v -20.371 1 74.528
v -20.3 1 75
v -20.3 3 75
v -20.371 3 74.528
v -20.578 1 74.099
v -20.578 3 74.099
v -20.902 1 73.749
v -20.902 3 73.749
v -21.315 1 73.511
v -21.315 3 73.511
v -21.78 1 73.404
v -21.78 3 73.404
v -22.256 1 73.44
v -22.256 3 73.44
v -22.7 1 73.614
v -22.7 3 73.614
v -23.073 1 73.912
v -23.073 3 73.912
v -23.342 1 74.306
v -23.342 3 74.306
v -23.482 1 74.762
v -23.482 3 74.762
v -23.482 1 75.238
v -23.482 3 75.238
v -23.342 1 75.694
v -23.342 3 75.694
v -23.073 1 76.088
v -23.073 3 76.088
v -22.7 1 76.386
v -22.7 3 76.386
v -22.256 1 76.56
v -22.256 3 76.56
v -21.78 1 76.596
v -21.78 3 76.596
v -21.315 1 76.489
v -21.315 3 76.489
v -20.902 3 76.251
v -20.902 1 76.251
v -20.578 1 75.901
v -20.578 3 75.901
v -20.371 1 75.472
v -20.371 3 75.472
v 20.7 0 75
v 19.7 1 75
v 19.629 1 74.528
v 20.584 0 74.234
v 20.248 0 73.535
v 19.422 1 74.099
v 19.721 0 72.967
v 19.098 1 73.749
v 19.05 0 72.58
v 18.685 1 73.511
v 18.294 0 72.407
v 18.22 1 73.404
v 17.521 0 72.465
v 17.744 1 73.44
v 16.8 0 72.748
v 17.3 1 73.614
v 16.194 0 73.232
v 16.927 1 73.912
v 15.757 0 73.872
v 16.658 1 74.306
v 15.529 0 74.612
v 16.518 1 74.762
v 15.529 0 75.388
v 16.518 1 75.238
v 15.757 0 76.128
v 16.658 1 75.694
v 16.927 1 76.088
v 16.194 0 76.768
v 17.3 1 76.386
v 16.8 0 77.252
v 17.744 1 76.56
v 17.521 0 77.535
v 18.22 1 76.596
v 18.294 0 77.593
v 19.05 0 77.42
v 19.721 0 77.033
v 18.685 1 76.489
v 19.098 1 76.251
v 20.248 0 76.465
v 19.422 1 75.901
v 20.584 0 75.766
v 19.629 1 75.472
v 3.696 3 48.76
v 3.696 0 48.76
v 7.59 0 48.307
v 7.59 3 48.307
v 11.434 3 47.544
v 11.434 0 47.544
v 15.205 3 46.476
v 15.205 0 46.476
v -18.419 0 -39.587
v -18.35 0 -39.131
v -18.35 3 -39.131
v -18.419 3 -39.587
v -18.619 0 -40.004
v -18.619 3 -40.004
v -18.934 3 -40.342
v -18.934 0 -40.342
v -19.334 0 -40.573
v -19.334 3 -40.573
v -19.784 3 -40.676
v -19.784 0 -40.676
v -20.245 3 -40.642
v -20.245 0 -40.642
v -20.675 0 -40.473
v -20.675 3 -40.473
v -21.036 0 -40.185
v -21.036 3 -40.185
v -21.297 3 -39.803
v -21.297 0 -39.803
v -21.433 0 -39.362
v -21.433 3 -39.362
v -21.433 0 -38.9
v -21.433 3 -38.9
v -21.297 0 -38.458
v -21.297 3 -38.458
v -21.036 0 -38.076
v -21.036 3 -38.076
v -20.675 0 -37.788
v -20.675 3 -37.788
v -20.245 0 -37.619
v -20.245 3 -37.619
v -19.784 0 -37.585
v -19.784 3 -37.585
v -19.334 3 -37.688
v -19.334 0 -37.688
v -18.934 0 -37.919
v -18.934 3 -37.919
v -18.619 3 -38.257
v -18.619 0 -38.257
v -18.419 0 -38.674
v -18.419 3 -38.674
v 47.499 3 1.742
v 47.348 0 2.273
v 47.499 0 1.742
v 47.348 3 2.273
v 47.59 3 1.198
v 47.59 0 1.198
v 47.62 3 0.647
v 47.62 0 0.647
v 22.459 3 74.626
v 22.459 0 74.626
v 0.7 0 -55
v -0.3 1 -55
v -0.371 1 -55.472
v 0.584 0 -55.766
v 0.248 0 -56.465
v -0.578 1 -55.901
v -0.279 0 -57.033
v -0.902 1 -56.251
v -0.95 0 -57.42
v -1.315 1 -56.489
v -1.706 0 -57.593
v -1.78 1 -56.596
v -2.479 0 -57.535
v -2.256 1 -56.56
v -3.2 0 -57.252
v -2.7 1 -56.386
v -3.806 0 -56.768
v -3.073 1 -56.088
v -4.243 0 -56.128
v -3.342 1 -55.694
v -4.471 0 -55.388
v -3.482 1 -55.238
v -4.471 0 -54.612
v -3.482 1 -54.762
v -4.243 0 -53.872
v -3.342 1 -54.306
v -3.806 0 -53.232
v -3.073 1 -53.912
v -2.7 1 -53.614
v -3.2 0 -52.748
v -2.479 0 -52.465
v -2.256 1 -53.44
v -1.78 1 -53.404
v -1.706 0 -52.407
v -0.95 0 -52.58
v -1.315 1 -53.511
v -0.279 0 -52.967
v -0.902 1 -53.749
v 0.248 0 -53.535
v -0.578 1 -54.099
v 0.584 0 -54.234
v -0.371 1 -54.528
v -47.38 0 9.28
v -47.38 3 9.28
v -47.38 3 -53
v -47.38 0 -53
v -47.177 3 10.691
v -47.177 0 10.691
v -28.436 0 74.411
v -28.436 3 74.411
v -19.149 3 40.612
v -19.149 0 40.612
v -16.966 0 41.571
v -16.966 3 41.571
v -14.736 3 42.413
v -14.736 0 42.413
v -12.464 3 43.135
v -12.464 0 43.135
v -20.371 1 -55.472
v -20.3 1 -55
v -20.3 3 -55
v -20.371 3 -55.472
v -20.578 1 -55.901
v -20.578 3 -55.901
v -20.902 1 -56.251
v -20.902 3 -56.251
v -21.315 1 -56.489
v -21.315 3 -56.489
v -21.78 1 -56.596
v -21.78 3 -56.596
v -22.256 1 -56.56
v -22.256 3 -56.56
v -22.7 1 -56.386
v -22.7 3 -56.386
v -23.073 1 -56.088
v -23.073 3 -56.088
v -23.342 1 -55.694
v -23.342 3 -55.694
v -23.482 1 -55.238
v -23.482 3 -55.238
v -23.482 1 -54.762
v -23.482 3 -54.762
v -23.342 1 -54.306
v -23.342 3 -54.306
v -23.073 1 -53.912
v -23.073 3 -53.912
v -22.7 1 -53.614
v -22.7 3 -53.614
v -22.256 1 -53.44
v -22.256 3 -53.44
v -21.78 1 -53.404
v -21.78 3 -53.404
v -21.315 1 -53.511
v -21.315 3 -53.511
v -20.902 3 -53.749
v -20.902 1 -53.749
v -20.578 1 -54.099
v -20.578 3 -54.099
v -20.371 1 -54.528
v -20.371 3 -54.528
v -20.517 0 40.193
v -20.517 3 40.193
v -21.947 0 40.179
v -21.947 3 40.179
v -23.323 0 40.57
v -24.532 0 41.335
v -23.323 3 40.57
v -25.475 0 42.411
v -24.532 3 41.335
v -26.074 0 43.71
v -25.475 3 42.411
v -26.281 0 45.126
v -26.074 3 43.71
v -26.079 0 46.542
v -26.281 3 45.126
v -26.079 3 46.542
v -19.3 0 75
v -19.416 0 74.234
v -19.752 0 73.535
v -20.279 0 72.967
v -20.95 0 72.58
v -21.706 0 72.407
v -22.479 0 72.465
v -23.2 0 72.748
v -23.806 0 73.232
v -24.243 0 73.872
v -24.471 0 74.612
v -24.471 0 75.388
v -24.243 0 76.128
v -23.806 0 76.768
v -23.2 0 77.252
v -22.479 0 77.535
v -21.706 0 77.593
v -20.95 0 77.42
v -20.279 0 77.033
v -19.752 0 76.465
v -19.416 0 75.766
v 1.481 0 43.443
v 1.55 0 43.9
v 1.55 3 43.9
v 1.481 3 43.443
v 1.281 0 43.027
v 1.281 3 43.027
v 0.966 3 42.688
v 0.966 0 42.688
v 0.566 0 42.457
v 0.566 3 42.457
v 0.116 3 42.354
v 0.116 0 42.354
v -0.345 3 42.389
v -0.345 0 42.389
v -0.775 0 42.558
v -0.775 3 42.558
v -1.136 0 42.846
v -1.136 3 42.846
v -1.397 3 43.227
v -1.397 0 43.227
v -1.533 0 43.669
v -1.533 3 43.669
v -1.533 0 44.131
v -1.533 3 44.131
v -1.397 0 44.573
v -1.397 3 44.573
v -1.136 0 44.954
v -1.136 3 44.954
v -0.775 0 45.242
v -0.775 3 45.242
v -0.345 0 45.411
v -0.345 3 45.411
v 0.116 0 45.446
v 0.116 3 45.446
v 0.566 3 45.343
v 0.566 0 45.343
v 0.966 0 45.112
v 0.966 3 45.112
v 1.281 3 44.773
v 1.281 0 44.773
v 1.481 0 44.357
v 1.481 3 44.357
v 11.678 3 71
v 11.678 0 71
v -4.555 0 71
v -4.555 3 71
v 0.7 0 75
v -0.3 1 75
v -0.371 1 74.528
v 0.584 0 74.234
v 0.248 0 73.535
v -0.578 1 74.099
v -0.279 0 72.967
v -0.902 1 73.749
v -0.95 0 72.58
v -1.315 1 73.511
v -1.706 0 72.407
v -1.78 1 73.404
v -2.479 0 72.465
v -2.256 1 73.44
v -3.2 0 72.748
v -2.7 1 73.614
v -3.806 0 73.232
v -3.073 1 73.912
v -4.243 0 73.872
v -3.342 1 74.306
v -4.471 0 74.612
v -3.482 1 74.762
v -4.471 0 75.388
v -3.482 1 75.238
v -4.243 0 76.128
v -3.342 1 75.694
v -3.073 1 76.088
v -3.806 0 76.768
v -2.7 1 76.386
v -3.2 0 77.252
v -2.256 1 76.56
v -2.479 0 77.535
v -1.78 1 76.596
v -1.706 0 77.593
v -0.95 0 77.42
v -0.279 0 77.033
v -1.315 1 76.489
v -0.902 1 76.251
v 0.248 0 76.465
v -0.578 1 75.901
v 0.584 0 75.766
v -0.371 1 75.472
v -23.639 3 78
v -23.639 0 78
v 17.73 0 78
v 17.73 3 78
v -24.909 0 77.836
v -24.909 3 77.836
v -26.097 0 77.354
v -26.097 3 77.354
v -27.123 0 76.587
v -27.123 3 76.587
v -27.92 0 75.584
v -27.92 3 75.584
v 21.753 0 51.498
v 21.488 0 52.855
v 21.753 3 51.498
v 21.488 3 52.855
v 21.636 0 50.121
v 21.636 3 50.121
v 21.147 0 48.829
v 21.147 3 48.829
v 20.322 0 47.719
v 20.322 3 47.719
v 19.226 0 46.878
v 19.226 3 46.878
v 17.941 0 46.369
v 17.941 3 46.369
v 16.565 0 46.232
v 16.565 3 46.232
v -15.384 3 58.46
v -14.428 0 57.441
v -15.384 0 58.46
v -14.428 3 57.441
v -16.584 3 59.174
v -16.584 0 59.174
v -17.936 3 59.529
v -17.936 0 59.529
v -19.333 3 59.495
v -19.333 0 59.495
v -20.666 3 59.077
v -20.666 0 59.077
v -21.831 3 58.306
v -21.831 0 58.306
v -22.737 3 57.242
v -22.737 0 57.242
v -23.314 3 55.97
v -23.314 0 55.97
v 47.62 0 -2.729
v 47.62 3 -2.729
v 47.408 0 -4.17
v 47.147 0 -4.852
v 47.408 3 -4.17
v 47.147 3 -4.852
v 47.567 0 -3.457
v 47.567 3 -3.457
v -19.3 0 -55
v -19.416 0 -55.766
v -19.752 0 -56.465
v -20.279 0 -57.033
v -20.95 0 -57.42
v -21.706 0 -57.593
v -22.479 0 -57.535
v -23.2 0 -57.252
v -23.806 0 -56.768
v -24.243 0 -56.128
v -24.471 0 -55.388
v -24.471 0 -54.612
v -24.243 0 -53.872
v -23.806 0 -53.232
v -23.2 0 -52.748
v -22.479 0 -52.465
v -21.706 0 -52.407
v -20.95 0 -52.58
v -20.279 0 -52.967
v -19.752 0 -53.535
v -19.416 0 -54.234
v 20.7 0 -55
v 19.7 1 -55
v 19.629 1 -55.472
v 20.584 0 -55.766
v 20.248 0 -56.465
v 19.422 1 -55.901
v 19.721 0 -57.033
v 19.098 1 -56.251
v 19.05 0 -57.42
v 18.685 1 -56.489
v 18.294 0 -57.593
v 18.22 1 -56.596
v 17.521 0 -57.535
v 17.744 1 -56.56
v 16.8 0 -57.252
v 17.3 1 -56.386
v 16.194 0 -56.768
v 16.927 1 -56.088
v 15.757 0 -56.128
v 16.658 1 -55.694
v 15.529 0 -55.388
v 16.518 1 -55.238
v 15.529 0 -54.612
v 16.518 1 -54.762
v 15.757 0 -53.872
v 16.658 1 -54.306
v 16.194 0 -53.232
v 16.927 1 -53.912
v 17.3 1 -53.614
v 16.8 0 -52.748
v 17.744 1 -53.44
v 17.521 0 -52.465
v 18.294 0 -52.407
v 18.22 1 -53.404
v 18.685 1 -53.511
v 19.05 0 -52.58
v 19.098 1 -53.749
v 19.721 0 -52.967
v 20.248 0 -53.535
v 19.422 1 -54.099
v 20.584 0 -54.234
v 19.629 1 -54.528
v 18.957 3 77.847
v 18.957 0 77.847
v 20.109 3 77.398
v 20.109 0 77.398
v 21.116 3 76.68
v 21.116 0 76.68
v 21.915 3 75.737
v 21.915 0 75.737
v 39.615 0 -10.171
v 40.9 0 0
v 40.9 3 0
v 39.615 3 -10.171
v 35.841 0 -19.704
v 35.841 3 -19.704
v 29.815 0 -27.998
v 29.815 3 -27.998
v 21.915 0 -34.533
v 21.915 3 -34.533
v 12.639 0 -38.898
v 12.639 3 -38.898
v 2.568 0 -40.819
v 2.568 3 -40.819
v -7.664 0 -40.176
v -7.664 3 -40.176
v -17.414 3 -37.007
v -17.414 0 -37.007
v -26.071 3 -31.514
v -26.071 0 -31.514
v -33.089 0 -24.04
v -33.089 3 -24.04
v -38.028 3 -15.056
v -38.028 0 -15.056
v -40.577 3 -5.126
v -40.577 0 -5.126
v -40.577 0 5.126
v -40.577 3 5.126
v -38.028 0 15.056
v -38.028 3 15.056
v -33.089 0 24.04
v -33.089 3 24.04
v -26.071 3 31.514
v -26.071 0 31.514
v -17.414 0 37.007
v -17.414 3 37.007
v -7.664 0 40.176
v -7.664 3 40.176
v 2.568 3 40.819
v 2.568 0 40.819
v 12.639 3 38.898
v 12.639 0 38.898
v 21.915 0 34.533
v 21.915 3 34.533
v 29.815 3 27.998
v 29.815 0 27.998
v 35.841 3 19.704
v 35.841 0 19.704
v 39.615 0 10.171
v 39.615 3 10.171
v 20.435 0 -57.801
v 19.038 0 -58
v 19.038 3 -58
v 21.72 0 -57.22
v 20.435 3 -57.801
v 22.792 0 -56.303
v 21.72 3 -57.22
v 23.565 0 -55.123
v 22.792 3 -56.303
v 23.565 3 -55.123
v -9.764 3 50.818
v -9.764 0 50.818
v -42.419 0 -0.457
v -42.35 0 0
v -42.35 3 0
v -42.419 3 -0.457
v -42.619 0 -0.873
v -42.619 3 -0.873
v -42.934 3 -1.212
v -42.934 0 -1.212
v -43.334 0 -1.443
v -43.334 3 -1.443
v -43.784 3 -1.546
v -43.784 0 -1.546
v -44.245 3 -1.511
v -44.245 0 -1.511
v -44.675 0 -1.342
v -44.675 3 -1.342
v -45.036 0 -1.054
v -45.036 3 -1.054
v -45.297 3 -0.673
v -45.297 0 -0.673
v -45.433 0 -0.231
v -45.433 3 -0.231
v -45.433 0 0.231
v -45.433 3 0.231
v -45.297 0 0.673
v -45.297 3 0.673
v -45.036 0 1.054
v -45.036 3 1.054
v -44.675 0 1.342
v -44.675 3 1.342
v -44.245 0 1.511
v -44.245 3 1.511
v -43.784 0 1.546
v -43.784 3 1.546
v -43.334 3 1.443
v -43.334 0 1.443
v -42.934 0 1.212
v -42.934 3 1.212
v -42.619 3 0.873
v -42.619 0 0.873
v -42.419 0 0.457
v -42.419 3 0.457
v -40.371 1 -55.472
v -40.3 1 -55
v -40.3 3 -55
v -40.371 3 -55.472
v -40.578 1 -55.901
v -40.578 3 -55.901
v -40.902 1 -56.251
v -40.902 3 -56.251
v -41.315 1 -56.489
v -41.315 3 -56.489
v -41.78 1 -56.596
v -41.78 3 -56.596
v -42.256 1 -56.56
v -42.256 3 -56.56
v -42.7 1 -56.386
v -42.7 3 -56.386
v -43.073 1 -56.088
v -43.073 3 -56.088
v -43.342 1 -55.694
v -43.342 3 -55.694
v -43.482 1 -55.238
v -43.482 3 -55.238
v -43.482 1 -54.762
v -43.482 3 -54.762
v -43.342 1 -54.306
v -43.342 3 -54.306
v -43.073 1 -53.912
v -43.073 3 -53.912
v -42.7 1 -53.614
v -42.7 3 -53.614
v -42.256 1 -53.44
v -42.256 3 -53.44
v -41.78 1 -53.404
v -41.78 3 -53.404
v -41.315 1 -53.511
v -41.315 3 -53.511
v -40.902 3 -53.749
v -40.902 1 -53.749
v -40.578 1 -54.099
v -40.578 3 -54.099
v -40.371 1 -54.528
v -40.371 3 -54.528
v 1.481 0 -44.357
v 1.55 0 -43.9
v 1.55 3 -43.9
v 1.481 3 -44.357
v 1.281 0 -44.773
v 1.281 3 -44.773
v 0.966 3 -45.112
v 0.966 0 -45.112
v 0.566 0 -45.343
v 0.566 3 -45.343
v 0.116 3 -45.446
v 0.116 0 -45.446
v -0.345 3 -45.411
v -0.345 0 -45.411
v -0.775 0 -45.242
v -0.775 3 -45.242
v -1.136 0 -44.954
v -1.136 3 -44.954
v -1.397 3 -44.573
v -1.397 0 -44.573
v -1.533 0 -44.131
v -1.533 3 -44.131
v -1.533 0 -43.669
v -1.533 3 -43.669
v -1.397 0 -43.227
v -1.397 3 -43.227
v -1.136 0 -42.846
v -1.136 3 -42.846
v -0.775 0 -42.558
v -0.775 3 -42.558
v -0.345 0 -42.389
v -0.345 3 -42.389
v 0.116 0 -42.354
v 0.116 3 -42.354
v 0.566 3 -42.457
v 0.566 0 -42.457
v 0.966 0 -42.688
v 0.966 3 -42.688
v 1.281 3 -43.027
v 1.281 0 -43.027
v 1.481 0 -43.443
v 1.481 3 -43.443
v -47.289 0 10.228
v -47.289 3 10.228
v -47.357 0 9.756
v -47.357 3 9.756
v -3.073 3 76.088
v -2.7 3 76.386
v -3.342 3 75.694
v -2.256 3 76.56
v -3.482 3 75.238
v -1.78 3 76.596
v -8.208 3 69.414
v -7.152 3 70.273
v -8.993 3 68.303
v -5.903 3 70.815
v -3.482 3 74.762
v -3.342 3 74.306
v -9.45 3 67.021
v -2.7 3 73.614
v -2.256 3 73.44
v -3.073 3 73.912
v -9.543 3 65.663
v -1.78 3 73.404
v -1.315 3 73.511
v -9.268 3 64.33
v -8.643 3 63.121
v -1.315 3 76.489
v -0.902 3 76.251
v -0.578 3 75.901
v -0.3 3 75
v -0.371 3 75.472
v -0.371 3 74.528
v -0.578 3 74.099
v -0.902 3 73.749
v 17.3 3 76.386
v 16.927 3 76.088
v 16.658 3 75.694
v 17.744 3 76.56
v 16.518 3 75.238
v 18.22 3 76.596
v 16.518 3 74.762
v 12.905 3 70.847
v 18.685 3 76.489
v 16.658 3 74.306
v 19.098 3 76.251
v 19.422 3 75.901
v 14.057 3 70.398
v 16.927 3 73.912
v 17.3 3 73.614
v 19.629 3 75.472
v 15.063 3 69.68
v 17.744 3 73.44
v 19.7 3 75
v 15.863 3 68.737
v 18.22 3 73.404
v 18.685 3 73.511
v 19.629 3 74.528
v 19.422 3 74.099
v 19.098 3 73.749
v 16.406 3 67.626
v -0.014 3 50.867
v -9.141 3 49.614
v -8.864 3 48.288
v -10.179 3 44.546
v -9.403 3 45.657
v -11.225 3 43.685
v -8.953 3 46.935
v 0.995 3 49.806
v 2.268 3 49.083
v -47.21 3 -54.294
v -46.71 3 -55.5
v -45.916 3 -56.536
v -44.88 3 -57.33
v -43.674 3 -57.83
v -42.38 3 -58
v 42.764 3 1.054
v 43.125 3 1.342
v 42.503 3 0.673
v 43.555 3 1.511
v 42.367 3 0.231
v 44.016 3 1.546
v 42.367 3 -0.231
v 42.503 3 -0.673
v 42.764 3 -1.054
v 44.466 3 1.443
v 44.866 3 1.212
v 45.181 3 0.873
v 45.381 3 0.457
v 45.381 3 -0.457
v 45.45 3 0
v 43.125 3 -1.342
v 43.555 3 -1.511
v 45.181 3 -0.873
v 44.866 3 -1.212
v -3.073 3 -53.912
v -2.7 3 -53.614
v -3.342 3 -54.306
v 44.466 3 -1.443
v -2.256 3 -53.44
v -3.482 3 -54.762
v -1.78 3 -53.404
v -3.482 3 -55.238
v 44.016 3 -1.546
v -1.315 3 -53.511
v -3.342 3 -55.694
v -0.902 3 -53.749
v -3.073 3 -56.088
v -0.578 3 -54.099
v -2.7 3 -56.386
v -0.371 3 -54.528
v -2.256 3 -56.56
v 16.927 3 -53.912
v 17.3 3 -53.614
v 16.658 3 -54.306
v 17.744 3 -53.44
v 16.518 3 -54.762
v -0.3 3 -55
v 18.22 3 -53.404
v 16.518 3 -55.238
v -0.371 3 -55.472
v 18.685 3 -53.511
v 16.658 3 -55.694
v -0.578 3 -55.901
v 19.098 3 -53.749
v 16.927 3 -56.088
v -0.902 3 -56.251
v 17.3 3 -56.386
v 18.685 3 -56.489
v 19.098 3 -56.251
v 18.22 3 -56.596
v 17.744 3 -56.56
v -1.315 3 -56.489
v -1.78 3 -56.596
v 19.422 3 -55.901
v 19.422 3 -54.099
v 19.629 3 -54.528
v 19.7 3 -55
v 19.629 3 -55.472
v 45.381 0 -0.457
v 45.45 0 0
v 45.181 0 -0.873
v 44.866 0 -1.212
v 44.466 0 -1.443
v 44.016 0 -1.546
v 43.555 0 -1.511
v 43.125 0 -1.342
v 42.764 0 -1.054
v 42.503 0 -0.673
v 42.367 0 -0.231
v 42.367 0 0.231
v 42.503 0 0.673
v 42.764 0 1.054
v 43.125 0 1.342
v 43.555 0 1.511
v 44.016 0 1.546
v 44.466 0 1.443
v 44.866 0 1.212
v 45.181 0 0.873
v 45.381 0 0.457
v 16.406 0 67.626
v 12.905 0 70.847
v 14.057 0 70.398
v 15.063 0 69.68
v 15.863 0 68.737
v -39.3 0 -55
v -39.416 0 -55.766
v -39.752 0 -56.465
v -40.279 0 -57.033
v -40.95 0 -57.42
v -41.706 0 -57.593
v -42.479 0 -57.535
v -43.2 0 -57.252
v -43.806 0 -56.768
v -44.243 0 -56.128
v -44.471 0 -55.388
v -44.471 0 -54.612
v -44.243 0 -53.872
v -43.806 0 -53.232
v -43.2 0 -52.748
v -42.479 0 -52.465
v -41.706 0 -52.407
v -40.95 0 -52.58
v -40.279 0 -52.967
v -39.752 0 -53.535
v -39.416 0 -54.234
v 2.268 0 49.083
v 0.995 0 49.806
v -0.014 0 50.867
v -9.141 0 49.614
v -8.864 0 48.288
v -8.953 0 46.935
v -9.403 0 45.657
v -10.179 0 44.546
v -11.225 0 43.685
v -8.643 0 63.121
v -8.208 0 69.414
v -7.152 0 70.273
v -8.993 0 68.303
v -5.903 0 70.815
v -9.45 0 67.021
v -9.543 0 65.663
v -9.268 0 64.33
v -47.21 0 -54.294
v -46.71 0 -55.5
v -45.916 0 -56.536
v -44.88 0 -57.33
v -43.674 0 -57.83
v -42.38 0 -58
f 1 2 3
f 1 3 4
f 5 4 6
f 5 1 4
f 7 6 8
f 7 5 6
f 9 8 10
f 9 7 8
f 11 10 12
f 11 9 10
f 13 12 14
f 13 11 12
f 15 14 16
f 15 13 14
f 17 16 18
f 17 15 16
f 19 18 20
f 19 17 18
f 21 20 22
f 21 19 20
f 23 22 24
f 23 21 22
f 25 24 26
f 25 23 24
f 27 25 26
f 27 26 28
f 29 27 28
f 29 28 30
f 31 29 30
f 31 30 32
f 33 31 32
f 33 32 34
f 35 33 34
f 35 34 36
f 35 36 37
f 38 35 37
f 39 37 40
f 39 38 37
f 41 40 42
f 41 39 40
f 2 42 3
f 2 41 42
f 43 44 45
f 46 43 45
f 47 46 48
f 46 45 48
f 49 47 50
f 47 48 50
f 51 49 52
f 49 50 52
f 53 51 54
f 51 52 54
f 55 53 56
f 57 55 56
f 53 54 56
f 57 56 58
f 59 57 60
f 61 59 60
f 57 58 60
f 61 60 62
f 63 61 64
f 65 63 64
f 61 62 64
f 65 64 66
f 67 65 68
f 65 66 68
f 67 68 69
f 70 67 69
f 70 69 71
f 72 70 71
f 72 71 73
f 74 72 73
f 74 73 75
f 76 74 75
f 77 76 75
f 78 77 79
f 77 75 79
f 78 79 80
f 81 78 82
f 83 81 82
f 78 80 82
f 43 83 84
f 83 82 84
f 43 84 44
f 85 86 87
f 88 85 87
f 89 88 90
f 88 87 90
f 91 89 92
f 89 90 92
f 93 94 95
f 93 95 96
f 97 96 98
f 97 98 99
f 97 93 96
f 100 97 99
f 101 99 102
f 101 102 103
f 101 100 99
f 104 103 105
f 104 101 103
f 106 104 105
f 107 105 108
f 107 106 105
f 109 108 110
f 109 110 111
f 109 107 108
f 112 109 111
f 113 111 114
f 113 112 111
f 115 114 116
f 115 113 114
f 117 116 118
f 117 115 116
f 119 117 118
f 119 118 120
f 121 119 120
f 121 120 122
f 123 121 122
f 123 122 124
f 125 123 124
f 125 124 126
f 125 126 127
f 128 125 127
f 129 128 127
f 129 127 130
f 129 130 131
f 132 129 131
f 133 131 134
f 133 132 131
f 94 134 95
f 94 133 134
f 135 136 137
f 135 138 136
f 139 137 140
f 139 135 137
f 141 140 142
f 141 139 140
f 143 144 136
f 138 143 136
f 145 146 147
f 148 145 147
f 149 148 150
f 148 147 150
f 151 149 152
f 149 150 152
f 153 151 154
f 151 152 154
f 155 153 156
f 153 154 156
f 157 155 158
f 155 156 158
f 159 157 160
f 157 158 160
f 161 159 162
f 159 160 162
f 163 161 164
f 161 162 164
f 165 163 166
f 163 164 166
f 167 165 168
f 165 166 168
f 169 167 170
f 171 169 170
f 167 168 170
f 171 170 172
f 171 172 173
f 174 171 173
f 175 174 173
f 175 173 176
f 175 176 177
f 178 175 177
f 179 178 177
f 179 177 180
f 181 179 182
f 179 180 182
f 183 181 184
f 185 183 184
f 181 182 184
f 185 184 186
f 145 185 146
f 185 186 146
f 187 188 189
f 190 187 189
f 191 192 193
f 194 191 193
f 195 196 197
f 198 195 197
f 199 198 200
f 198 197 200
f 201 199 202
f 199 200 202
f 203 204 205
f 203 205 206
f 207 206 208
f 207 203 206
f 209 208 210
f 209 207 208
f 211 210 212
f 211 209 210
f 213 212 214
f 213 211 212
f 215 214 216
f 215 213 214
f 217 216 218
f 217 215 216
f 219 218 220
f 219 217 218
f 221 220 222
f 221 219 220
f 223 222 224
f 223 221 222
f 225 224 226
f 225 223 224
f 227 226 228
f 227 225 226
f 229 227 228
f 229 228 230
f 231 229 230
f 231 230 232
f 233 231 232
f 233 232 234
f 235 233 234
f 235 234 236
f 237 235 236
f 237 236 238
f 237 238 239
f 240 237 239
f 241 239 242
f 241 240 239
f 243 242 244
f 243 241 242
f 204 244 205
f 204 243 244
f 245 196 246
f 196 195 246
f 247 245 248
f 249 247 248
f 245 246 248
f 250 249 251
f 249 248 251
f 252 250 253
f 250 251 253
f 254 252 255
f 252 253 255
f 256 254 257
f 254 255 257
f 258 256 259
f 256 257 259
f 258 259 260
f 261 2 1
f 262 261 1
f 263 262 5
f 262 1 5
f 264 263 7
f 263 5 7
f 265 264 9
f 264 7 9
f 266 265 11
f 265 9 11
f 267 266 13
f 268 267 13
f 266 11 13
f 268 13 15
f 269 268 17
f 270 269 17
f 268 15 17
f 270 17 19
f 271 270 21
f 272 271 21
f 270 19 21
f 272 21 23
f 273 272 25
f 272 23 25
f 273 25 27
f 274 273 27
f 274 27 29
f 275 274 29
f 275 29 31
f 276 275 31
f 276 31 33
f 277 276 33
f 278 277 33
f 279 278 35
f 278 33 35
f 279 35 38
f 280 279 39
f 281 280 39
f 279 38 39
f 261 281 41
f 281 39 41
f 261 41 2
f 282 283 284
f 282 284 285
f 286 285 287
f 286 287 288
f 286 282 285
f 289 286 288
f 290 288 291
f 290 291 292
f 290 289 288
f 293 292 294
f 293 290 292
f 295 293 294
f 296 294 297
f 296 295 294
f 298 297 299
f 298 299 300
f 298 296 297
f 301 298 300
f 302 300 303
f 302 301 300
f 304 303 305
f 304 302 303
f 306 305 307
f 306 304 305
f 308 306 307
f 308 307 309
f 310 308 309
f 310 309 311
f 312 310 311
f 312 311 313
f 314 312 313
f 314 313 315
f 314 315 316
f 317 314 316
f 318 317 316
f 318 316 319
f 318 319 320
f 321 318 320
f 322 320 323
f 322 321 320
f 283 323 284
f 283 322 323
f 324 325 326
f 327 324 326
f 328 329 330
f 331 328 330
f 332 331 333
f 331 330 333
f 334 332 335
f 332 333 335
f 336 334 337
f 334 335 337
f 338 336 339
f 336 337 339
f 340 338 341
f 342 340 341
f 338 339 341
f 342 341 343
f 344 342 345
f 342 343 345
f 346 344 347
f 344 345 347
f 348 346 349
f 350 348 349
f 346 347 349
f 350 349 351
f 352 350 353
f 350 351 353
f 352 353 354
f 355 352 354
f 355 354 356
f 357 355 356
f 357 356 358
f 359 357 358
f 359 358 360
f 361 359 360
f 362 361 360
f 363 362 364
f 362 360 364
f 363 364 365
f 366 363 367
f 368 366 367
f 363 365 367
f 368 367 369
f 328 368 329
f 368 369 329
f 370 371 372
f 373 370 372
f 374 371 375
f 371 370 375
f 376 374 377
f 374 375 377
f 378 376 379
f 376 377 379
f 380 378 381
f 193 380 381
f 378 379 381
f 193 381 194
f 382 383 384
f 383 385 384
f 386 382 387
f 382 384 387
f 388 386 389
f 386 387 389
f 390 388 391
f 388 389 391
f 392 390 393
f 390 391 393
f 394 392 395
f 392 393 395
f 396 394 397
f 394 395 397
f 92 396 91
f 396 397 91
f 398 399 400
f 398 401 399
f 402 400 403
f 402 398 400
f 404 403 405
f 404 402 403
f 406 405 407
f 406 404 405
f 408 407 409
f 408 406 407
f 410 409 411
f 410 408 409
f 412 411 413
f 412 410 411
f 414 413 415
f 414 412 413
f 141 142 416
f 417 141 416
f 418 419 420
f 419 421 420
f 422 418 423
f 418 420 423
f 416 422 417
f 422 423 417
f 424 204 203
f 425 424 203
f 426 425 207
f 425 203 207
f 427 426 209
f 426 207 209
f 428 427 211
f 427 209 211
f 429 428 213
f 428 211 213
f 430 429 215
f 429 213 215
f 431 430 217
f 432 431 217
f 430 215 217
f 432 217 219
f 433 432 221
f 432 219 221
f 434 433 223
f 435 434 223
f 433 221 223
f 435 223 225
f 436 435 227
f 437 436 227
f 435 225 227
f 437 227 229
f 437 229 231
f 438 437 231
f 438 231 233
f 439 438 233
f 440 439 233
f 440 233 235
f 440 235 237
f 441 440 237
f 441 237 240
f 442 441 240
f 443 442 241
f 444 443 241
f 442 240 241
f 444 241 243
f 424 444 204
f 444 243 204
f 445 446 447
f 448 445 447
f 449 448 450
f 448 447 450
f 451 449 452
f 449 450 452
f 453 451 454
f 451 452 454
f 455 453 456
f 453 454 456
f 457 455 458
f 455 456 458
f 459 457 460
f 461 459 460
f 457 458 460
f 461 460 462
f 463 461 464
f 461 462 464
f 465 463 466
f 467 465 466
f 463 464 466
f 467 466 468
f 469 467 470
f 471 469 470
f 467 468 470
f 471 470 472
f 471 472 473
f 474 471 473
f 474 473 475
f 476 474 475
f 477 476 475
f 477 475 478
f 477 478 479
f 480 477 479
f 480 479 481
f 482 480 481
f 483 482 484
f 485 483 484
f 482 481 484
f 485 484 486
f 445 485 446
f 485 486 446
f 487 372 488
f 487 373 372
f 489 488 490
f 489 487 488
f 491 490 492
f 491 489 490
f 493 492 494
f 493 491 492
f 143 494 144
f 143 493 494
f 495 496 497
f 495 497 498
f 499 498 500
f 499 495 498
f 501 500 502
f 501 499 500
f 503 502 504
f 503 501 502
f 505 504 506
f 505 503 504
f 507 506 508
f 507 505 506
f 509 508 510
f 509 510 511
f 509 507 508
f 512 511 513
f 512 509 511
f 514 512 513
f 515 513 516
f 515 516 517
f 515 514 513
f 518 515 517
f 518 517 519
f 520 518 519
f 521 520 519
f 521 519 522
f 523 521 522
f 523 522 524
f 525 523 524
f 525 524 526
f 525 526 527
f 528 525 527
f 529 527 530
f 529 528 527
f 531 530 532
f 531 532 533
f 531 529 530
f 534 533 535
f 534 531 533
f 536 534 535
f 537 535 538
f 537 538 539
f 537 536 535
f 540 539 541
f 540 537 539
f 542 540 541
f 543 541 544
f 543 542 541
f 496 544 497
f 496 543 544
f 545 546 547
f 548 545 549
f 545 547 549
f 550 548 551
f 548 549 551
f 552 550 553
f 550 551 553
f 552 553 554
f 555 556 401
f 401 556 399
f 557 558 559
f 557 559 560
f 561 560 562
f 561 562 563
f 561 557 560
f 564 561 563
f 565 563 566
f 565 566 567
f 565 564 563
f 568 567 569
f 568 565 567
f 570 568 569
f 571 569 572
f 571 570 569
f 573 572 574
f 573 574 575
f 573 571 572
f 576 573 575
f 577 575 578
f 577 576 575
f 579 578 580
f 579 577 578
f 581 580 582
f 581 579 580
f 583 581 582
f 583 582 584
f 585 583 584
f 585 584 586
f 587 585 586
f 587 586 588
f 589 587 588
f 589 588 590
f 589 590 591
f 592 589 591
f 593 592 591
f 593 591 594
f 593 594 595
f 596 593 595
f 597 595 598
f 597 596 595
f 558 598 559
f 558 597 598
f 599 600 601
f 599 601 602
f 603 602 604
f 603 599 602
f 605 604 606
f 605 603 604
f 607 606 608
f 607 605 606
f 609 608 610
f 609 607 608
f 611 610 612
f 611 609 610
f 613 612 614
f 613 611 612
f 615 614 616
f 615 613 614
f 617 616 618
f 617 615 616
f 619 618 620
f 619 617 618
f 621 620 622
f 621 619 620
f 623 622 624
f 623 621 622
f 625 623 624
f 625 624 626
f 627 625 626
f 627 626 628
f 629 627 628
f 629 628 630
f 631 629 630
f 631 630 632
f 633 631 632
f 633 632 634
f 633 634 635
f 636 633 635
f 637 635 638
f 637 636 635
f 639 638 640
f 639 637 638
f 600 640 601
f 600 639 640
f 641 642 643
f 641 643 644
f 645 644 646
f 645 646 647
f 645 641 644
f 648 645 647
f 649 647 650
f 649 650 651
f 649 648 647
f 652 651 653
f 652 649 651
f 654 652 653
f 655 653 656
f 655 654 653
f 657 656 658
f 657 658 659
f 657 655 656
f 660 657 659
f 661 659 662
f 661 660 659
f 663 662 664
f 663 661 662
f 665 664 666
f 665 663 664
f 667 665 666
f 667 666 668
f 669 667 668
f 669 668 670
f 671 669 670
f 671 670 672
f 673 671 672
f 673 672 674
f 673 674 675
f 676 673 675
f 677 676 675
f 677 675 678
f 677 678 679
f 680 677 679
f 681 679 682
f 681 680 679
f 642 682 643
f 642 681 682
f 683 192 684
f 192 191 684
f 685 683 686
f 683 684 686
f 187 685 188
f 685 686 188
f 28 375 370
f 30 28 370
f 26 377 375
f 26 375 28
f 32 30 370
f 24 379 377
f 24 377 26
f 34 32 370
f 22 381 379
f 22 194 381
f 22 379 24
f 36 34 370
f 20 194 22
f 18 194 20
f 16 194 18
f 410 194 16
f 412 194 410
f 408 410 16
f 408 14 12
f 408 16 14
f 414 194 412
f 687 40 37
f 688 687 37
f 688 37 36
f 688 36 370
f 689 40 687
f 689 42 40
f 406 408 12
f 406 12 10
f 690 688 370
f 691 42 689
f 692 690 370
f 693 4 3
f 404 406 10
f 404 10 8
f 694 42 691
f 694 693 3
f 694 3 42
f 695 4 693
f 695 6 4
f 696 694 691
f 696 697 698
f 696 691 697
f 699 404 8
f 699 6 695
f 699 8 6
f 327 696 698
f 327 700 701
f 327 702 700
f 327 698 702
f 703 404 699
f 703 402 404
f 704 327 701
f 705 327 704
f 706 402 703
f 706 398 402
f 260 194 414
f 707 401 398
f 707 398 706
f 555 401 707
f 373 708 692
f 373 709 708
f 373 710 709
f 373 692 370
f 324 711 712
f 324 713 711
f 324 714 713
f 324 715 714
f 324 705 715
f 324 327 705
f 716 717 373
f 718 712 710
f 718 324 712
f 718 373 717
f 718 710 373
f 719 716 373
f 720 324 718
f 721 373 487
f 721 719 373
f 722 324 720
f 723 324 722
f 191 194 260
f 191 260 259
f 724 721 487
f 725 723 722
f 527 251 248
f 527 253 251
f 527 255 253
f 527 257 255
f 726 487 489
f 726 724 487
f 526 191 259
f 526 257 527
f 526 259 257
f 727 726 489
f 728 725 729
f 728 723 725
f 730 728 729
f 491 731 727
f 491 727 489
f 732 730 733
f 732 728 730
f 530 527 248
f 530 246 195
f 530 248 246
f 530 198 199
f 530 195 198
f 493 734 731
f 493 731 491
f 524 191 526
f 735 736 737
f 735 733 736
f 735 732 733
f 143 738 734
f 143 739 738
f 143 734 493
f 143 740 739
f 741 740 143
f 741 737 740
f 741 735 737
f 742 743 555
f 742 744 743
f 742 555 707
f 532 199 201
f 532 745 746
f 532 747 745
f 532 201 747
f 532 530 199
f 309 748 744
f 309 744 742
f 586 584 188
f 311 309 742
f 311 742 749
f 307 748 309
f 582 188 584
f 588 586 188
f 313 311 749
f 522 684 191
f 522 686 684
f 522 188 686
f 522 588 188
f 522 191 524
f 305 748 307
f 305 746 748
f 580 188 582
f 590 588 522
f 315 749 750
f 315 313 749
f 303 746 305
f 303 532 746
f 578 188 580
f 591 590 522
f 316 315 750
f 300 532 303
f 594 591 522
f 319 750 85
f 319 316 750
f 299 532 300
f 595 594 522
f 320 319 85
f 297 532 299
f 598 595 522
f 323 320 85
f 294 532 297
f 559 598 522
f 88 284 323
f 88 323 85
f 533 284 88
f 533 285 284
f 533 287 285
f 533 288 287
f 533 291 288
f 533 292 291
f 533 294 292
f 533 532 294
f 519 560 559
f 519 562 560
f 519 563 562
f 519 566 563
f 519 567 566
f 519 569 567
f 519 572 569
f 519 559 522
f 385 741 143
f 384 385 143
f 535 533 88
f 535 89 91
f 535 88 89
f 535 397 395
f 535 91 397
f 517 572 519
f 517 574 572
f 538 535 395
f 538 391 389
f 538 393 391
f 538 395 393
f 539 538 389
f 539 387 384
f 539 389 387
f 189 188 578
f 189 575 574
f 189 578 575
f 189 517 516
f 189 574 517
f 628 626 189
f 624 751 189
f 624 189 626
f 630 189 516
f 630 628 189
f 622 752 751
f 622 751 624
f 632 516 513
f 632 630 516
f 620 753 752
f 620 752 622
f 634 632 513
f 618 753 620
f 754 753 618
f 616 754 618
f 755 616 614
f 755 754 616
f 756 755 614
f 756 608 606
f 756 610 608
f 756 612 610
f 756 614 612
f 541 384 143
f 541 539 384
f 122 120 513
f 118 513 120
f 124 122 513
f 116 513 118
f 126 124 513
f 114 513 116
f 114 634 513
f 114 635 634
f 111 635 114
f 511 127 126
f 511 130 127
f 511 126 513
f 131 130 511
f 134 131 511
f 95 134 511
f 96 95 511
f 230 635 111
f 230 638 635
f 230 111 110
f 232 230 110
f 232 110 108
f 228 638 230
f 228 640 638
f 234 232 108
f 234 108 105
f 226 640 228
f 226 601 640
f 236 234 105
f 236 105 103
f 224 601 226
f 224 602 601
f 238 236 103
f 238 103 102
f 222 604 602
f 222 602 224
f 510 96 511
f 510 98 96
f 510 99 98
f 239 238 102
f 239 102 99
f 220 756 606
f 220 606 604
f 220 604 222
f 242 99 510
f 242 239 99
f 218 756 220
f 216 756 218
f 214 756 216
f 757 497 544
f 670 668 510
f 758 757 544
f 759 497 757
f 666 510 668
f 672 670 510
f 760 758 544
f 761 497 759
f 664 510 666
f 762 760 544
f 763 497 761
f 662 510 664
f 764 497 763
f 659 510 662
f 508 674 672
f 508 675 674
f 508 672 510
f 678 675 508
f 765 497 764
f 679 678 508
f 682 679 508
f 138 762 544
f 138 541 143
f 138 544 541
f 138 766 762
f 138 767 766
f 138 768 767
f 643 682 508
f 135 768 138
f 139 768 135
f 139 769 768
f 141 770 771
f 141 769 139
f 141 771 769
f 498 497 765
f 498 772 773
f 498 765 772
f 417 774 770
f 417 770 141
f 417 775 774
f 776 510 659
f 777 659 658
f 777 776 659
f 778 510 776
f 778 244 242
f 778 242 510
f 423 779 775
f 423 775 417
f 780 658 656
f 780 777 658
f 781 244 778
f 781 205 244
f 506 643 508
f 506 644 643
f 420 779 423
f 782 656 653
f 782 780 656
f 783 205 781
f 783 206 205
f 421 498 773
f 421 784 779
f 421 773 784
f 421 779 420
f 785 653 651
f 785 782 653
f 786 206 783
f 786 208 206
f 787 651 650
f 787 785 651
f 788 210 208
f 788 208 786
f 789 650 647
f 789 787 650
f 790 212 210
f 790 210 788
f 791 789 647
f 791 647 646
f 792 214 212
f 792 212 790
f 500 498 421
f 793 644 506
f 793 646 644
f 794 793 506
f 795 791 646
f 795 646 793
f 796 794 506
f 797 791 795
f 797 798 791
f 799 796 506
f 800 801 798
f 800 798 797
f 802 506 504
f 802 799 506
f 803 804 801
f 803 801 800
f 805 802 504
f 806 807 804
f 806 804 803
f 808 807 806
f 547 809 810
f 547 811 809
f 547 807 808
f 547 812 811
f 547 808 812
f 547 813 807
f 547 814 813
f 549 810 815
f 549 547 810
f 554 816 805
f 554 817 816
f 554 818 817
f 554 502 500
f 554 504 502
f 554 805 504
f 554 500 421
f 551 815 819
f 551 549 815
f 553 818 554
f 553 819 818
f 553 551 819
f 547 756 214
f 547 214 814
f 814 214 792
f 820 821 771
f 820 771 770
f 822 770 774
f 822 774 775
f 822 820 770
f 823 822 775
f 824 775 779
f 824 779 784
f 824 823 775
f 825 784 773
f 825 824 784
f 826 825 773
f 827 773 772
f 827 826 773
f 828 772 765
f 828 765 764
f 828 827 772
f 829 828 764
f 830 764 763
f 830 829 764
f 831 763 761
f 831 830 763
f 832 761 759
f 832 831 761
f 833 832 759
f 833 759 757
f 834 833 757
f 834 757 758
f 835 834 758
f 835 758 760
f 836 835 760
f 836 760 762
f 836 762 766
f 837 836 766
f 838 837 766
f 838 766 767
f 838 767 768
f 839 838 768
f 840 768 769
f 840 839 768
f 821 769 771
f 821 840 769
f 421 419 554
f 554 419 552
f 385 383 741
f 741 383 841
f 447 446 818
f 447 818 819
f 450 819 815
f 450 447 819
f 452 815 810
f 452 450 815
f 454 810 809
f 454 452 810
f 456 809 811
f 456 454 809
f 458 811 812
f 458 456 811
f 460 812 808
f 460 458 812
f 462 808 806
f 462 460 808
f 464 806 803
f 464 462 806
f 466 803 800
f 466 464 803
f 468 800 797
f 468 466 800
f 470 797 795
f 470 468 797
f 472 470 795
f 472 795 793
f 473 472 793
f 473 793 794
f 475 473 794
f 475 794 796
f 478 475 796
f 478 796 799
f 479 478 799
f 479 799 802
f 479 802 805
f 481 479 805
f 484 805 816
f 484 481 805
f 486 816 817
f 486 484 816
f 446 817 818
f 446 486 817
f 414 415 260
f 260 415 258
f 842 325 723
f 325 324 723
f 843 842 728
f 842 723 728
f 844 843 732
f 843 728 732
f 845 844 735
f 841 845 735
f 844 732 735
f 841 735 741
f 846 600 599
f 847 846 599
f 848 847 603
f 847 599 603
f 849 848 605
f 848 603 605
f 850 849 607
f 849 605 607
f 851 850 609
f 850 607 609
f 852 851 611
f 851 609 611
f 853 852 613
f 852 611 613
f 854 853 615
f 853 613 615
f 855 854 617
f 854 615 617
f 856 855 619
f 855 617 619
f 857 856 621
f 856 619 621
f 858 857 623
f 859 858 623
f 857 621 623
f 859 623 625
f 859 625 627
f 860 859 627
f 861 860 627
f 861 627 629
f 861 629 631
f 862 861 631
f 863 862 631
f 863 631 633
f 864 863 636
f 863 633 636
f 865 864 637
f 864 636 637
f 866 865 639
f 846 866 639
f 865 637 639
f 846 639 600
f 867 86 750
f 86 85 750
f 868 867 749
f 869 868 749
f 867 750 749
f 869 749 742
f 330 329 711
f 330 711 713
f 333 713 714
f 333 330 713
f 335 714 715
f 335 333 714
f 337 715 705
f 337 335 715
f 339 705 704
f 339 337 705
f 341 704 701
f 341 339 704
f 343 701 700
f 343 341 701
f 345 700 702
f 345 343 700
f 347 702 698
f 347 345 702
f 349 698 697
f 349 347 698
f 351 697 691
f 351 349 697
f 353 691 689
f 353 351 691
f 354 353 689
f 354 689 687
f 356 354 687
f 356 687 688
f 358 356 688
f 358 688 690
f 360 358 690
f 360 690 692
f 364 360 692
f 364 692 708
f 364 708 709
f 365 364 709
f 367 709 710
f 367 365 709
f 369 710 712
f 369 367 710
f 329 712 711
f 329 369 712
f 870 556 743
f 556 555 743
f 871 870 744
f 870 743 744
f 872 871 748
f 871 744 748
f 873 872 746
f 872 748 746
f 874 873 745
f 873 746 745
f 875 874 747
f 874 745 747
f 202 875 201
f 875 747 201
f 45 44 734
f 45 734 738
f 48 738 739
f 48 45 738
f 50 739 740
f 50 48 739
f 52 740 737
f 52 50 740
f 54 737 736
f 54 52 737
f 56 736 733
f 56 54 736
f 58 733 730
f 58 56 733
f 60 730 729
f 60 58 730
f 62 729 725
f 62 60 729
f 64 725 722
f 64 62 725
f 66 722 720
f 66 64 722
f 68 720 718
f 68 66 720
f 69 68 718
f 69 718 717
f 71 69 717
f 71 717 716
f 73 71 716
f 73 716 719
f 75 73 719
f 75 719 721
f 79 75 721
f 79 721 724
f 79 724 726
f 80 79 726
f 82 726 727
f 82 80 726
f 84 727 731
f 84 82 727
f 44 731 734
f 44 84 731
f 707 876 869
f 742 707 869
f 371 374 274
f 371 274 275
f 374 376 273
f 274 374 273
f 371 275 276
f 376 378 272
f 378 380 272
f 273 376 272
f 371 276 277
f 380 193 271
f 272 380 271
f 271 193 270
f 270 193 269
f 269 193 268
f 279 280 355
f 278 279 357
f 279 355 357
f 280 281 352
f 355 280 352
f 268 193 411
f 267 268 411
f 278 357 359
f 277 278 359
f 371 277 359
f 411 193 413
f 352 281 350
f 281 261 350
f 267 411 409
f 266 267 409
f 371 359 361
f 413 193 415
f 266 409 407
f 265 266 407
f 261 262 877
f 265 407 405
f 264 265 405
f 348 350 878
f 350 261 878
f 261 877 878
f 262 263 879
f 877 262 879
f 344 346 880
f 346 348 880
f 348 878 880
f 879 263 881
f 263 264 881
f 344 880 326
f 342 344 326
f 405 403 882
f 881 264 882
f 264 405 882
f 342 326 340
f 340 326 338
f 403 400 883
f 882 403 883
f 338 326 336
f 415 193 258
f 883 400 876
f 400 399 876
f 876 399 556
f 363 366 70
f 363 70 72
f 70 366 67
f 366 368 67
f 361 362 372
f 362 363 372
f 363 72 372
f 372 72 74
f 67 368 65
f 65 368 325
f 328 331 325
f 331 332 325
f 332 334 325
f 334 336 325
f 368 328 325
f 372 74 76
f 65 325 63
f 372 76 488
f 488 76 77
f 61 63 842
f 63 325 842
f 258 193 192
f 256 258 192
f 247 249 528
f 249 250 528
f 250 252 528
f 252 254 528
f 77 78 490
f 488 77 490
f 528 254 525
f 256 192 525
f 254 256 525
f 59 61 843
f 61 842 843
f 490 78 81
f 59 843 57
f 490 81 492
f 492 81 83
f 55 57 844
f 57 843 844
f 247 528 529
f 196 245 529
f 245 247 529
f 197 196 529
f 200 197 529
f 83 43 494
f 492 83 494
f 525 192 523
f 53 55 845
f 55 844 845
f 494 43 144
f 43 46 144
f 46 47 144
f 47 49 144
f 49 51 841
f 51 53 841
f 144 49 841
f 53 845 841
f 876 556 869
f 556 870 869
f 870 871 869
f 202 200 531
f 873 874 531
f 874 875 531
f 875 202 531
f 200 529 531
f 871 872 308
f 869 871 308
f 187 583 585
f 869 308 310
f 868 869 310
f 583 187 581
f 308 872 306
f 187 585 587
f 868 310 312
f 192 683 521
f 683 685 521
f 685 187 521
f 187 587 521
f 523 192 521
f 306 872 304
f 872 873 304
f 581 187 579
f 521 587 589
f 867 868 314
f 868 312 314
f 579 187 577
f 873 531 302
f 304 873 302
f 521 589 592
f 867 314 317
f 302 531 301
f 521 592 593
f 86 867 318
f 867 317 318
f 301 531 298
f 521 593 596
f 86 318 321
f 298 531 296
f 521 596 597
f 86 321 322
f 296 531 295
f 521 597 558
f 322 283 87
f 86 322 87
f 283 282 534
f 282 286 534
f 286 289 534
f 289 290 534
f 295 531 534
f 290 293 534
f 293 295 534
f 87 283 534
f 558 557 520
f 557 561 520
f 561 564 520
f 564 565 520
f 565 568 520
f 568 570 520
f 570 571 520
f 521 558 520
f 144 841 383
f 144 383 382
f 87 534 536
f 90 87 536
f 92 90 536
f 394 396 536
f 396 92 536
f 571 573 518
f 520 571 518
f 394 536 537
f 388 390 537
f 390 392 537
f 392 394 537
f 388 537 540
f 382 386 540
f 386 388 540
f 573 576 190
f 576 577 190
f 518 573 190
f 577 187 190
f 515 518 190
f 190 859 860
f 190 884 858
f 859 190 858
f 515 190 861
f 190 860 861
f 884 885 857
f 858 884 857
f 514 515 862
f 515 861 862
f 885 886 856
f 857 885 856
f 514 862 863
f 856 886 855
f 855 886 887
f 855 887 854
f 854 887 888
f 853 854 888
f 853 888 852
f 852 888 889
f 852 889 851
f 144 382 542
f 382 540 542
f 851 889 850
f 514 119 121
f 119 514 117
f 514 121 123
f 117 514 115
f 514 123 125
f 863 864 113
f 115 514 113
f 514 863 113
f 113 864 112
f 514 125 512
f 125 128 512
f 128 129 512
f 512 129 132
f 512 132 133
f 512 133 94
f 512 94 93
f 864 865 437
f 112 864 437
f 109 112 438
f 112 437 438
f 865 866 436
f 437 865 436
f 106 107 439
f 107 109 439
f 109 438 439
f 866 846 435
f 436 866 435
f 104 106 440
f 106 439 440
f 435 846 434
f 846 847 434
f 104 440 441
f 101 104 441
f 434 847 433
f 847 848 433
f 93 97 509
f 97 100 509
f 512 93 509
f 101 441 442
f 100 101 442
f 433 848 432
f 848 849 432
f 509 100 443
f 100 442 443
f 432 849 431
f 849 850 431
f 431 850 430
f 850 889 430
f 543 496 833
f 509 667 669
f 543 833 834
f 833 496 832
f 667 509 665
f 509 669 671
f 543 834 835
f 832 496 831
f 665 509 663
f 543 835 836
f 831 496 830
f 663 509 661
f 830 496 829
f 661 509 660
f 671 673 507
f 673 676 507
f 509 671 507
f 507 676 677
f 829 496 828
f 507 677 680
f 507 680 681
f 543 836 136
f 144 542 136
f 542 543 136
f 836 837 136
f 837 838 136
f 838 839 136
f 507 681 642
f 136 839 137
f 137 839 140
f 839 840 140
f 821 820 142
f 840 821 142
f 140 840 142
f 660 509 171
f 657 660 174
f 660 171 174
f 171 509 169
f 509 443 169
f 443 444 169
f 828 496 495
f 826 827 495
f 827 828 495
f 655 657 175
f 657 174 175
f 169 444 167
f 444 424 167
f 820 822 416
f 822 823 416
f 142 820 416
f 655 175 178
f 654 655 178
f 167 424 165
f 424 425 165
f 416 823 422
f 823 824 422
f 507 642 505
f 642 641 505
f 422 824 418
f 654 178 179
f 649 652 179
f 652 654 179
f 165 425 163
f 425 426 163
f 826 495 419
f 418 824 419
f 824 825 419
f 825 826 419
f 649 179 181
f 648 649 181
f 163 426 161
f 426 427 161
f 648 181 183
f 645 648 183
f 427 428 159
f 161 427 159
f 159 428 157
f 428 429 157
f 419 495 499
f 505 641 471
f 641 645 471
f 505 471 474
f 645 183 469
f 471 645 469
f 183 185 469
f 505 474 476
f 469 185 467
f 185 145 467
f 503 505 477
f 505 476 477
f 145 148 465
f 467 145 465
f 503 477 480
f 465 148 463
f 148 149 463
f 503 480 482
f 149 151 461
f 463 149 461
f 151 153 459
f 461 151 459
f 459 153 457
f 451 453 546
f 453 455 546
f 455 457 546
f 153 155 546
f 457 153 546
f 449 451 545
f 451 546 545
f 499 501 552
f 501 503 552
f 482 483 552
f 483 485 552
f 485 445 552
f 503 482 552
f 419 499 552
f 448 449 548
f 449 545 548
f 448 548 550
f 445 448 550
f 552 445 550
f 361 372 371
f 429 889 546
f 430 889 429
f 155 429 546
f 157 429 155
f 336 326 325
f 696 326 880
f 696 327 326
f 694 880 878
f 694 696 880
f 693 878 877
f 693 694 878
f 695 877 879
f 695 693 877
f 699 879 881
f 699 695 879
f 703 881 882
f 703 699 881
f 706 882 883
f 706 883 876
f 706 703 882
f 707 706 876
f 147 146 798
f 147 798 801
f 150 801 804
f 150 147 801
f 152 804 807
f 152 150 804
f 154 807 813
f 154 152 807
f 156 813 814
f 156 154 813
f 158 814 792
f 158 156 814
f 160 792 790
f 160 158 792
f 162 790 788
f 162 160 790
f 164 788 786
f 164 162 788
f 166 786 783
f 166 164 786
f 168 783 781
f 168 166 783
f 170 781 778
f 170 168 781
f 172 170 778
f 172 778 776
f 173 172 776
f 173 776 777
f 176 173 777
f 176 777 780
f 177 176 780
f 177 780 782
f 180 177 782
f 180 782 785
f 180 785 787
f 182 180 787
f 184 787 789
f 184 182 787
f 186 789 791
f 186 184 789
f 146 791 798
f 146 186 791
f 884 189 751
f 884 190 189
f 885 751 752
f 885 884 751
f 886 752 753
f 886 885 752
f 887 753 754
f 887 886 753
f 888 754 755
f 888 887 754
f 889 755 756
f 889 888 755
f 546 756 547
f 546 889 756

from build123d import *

# Parameters (mm, degrees)
SKETCH_1_W          = 160
SKETCH_1_H          = 136
SKETCH_1_R          = 40.9
SKETCH_1_R_2        = 1.55
SKETCH_1_R_3        = 1.6
EXTRUDE_1_DEPTH     = 3
SKETCH_2_W          = 25
SKETCH_2_H          = 136
EXTRUDE_2_DEPTH     = 3
SKETCH_3_W          = 90
SKETCH_3_H          = 136
CUT_EXTRUDE_1_DEPTH = 4
CUT_EXTRUDE_3_DEPTH = 4
FILLET_1_R          = 5
FILLET_2_R          = 5
CHAMFER_1_SIZE      = 1


with BuildPart() as part:
    # 草图1 → 凸台-拉伸1 (new body)
    with BuildSketch(Plane(origin=(0, 0, 0), x_dir=(1, 0, 0), z_dir=(0, 1, 0))):
        with Locations((-32.38, -10)):
            Rectangle(SKETCH_1_W, SKETCH_1_H)
        Circle(SKETCH_1_R, mode=Mode.SUBTRACT)
        with Locations((0, 43.9)):
            Circle(SKETCH_1_R_2, mode=Mode.SUBTRACT)
        with Locations((43.9, 0)):
            Circle(SKETCH_1_R_2, mode=Mode.SUBTRACT)
        with Locations((0, -43.9)):
            Circle(SKETCH_1_R_2, mode=Mode.SUBTRACT)
        with Locations((-43.9, 0)):
            Circle(SKETCH_1_R_2, mode=Mode.SUBTRACT)
        with Locations((-19.9, 39.130550724)):
            Circle(SKETCH_1_R_2, mode=Mode.SUBTRACT)
        with Locations((18.1, 55)):
            Circle(SKETCH_1_R_3, mode=Mode.SUBTRACT)
        with Locations((-1.9, 55)):
            Circle(SKETCH_1_R_3, mode=Mode.SUBTRACT)
        with Locations((-21.9, 55)):
            Circle(SKETCH_1_R_3, mode=Mode.SUBTRACT)
        with Locations((-41.9, 55)):
            Circle(SKETCH_1_R_3, mode=Mode.SUBTRACT)
        with Locations((18.1, -75)):
            Circle(SKETCH_1_R_3, mode=Mode.SUBTRACT)
        with Locations((-1.9, -75)):
            Circle(SKETCH_1_R_3, mode=Mode.SUBTRACT)
        with Locations((-21.9, -75)):
            Circle(SKETCH_1_R_3, mode=Mode.SUBTRACT)
        with Locations((-41.9, -75)):
            Circle(SKETCH_1_R_3, mode=Mode.SUBTRACT)
    extrude(amount=EXTRUDE_1_DEPTH)

    # 草图2 → 凸台-拉伸2 (add)
    with BuildSketch(Plane(origin=(0, 0, 0), x_dir=(1, 0, 0), z_dir=(0, 1, 0))):
        with Locations((-124.88, -10)):
            Rectangle(SKETCH_2_W, SKETCH_2_H)
    extrude(amount=EXTRUDE_2_DEPTH)

    # 草图3 → 切除-拉伸1 (cut, through all)
    with BuildSketch(Plane(origin=(0, 3, 0), x_dir=(1, 0, 0), z_dir=(0, 1, 0))):
        with Locations((-92.38, -10)):
            Rectangle(SKETCH_3_W, SKETCH_3_H)
    extrude(amount=-CUT_EXTRUDE_1_DEPTH, mode=Mode.SUBTRACT)

    # 草图4 → 切除-拉伸3 (cut, through all)
    with BuildSketch(Plane(origin=(0, 0, 0), x_dir=(1, 0, 0), z_dir=(0, 1, 0))):
        Polygon((47.62, 58), (47.62, 3.843146871), (22.215512532, 58), align=None)
        Polygon((47.62, -1.482721699), (47.62, -78), (21.298056264, -78), align=None)
        with BuildLine():
            Line((-20.395912494, -65.916645202), (-29.90797954, -33.48914391))
            ThreePointArc((-29.90797954, -33.48914391), (-18.489584756, -40.916320162), (-5.369508319, -44.577778998))
            Line((-5.369508319, -44.577778998), (-20.395912494, -65.916645202))
        make_face()
        with BuildLine():
            Line((-14.191049882, -71), (1.385146854, -48.880378151))
            ThreePointArc((1.385146854, -48.880378151), (13.780479279, -46.918103018), (25.268173443, -41.865611316))
            Line((25.268173443, -41.865611316), (15.245943736, -71))
            Line((15.245943736, -71), (-14.191049882, -71))
        make_face()
        Polygon((-47.38, -78), (-47.38, -26), (-47.38, -10), (-27.38, -78), align=None)
    extrude(amount=CUT_EXTRUDE_3_DEPTH, mode=Mode.SUBTRACT)

    # 圆角1
    fillet_1_edges = [part.edges().sort_by_distance(p)[0] for p in [
        (22.215512532, 1.5, -58),
        (47.62, 1.5, -3.843146871),
        (-27.38, 1.5, 78),
        (-47.38, 1.5, 10),
        (47.62, 1.5, 1.482721699),
        (21.298056264, 1.5, 78),
        (-47.38, 1.5, -58),
    ]]
    fillet(fillet_1_edges, radius=FILLET_1_R)

    # 圆角2
    fillet_2_edges = [part.edges().sort_by_distance(p)[0] for p in [
        (-14.191049882, 1.5, 71),
        (15.245943736, 1.5, 71),
        (25.268173443, 1.5, 41.865611316),
        (1.385146854, 1.5, 48.880378151),
        (-5.369508319, 1.5, 44.577778998),
        (-29.90797954, 1.5, 33.48914391),
        (-20.395912494, 1.5, 65.916645202),
    ]]
    fillet(fillet_2_edges, radius=FILLET_2_R)

    # 倒角1
    chamfer_1_edges = [part.edges().sort_by_distance(p)[0] for p in [
        (16.5, 0, -55),
        (-3.5, 0, -55),
        (-23.5, 0, -55),
        (-43.5, 0, -55),
        (16.5, 0, 75),
        (-3.5, 0, 75),
        (-23.5, 0, 75),
    ]]
    chamfer(chamfer_1_edges, length=CHAMFER_1_SIZE)


solid = part.part
